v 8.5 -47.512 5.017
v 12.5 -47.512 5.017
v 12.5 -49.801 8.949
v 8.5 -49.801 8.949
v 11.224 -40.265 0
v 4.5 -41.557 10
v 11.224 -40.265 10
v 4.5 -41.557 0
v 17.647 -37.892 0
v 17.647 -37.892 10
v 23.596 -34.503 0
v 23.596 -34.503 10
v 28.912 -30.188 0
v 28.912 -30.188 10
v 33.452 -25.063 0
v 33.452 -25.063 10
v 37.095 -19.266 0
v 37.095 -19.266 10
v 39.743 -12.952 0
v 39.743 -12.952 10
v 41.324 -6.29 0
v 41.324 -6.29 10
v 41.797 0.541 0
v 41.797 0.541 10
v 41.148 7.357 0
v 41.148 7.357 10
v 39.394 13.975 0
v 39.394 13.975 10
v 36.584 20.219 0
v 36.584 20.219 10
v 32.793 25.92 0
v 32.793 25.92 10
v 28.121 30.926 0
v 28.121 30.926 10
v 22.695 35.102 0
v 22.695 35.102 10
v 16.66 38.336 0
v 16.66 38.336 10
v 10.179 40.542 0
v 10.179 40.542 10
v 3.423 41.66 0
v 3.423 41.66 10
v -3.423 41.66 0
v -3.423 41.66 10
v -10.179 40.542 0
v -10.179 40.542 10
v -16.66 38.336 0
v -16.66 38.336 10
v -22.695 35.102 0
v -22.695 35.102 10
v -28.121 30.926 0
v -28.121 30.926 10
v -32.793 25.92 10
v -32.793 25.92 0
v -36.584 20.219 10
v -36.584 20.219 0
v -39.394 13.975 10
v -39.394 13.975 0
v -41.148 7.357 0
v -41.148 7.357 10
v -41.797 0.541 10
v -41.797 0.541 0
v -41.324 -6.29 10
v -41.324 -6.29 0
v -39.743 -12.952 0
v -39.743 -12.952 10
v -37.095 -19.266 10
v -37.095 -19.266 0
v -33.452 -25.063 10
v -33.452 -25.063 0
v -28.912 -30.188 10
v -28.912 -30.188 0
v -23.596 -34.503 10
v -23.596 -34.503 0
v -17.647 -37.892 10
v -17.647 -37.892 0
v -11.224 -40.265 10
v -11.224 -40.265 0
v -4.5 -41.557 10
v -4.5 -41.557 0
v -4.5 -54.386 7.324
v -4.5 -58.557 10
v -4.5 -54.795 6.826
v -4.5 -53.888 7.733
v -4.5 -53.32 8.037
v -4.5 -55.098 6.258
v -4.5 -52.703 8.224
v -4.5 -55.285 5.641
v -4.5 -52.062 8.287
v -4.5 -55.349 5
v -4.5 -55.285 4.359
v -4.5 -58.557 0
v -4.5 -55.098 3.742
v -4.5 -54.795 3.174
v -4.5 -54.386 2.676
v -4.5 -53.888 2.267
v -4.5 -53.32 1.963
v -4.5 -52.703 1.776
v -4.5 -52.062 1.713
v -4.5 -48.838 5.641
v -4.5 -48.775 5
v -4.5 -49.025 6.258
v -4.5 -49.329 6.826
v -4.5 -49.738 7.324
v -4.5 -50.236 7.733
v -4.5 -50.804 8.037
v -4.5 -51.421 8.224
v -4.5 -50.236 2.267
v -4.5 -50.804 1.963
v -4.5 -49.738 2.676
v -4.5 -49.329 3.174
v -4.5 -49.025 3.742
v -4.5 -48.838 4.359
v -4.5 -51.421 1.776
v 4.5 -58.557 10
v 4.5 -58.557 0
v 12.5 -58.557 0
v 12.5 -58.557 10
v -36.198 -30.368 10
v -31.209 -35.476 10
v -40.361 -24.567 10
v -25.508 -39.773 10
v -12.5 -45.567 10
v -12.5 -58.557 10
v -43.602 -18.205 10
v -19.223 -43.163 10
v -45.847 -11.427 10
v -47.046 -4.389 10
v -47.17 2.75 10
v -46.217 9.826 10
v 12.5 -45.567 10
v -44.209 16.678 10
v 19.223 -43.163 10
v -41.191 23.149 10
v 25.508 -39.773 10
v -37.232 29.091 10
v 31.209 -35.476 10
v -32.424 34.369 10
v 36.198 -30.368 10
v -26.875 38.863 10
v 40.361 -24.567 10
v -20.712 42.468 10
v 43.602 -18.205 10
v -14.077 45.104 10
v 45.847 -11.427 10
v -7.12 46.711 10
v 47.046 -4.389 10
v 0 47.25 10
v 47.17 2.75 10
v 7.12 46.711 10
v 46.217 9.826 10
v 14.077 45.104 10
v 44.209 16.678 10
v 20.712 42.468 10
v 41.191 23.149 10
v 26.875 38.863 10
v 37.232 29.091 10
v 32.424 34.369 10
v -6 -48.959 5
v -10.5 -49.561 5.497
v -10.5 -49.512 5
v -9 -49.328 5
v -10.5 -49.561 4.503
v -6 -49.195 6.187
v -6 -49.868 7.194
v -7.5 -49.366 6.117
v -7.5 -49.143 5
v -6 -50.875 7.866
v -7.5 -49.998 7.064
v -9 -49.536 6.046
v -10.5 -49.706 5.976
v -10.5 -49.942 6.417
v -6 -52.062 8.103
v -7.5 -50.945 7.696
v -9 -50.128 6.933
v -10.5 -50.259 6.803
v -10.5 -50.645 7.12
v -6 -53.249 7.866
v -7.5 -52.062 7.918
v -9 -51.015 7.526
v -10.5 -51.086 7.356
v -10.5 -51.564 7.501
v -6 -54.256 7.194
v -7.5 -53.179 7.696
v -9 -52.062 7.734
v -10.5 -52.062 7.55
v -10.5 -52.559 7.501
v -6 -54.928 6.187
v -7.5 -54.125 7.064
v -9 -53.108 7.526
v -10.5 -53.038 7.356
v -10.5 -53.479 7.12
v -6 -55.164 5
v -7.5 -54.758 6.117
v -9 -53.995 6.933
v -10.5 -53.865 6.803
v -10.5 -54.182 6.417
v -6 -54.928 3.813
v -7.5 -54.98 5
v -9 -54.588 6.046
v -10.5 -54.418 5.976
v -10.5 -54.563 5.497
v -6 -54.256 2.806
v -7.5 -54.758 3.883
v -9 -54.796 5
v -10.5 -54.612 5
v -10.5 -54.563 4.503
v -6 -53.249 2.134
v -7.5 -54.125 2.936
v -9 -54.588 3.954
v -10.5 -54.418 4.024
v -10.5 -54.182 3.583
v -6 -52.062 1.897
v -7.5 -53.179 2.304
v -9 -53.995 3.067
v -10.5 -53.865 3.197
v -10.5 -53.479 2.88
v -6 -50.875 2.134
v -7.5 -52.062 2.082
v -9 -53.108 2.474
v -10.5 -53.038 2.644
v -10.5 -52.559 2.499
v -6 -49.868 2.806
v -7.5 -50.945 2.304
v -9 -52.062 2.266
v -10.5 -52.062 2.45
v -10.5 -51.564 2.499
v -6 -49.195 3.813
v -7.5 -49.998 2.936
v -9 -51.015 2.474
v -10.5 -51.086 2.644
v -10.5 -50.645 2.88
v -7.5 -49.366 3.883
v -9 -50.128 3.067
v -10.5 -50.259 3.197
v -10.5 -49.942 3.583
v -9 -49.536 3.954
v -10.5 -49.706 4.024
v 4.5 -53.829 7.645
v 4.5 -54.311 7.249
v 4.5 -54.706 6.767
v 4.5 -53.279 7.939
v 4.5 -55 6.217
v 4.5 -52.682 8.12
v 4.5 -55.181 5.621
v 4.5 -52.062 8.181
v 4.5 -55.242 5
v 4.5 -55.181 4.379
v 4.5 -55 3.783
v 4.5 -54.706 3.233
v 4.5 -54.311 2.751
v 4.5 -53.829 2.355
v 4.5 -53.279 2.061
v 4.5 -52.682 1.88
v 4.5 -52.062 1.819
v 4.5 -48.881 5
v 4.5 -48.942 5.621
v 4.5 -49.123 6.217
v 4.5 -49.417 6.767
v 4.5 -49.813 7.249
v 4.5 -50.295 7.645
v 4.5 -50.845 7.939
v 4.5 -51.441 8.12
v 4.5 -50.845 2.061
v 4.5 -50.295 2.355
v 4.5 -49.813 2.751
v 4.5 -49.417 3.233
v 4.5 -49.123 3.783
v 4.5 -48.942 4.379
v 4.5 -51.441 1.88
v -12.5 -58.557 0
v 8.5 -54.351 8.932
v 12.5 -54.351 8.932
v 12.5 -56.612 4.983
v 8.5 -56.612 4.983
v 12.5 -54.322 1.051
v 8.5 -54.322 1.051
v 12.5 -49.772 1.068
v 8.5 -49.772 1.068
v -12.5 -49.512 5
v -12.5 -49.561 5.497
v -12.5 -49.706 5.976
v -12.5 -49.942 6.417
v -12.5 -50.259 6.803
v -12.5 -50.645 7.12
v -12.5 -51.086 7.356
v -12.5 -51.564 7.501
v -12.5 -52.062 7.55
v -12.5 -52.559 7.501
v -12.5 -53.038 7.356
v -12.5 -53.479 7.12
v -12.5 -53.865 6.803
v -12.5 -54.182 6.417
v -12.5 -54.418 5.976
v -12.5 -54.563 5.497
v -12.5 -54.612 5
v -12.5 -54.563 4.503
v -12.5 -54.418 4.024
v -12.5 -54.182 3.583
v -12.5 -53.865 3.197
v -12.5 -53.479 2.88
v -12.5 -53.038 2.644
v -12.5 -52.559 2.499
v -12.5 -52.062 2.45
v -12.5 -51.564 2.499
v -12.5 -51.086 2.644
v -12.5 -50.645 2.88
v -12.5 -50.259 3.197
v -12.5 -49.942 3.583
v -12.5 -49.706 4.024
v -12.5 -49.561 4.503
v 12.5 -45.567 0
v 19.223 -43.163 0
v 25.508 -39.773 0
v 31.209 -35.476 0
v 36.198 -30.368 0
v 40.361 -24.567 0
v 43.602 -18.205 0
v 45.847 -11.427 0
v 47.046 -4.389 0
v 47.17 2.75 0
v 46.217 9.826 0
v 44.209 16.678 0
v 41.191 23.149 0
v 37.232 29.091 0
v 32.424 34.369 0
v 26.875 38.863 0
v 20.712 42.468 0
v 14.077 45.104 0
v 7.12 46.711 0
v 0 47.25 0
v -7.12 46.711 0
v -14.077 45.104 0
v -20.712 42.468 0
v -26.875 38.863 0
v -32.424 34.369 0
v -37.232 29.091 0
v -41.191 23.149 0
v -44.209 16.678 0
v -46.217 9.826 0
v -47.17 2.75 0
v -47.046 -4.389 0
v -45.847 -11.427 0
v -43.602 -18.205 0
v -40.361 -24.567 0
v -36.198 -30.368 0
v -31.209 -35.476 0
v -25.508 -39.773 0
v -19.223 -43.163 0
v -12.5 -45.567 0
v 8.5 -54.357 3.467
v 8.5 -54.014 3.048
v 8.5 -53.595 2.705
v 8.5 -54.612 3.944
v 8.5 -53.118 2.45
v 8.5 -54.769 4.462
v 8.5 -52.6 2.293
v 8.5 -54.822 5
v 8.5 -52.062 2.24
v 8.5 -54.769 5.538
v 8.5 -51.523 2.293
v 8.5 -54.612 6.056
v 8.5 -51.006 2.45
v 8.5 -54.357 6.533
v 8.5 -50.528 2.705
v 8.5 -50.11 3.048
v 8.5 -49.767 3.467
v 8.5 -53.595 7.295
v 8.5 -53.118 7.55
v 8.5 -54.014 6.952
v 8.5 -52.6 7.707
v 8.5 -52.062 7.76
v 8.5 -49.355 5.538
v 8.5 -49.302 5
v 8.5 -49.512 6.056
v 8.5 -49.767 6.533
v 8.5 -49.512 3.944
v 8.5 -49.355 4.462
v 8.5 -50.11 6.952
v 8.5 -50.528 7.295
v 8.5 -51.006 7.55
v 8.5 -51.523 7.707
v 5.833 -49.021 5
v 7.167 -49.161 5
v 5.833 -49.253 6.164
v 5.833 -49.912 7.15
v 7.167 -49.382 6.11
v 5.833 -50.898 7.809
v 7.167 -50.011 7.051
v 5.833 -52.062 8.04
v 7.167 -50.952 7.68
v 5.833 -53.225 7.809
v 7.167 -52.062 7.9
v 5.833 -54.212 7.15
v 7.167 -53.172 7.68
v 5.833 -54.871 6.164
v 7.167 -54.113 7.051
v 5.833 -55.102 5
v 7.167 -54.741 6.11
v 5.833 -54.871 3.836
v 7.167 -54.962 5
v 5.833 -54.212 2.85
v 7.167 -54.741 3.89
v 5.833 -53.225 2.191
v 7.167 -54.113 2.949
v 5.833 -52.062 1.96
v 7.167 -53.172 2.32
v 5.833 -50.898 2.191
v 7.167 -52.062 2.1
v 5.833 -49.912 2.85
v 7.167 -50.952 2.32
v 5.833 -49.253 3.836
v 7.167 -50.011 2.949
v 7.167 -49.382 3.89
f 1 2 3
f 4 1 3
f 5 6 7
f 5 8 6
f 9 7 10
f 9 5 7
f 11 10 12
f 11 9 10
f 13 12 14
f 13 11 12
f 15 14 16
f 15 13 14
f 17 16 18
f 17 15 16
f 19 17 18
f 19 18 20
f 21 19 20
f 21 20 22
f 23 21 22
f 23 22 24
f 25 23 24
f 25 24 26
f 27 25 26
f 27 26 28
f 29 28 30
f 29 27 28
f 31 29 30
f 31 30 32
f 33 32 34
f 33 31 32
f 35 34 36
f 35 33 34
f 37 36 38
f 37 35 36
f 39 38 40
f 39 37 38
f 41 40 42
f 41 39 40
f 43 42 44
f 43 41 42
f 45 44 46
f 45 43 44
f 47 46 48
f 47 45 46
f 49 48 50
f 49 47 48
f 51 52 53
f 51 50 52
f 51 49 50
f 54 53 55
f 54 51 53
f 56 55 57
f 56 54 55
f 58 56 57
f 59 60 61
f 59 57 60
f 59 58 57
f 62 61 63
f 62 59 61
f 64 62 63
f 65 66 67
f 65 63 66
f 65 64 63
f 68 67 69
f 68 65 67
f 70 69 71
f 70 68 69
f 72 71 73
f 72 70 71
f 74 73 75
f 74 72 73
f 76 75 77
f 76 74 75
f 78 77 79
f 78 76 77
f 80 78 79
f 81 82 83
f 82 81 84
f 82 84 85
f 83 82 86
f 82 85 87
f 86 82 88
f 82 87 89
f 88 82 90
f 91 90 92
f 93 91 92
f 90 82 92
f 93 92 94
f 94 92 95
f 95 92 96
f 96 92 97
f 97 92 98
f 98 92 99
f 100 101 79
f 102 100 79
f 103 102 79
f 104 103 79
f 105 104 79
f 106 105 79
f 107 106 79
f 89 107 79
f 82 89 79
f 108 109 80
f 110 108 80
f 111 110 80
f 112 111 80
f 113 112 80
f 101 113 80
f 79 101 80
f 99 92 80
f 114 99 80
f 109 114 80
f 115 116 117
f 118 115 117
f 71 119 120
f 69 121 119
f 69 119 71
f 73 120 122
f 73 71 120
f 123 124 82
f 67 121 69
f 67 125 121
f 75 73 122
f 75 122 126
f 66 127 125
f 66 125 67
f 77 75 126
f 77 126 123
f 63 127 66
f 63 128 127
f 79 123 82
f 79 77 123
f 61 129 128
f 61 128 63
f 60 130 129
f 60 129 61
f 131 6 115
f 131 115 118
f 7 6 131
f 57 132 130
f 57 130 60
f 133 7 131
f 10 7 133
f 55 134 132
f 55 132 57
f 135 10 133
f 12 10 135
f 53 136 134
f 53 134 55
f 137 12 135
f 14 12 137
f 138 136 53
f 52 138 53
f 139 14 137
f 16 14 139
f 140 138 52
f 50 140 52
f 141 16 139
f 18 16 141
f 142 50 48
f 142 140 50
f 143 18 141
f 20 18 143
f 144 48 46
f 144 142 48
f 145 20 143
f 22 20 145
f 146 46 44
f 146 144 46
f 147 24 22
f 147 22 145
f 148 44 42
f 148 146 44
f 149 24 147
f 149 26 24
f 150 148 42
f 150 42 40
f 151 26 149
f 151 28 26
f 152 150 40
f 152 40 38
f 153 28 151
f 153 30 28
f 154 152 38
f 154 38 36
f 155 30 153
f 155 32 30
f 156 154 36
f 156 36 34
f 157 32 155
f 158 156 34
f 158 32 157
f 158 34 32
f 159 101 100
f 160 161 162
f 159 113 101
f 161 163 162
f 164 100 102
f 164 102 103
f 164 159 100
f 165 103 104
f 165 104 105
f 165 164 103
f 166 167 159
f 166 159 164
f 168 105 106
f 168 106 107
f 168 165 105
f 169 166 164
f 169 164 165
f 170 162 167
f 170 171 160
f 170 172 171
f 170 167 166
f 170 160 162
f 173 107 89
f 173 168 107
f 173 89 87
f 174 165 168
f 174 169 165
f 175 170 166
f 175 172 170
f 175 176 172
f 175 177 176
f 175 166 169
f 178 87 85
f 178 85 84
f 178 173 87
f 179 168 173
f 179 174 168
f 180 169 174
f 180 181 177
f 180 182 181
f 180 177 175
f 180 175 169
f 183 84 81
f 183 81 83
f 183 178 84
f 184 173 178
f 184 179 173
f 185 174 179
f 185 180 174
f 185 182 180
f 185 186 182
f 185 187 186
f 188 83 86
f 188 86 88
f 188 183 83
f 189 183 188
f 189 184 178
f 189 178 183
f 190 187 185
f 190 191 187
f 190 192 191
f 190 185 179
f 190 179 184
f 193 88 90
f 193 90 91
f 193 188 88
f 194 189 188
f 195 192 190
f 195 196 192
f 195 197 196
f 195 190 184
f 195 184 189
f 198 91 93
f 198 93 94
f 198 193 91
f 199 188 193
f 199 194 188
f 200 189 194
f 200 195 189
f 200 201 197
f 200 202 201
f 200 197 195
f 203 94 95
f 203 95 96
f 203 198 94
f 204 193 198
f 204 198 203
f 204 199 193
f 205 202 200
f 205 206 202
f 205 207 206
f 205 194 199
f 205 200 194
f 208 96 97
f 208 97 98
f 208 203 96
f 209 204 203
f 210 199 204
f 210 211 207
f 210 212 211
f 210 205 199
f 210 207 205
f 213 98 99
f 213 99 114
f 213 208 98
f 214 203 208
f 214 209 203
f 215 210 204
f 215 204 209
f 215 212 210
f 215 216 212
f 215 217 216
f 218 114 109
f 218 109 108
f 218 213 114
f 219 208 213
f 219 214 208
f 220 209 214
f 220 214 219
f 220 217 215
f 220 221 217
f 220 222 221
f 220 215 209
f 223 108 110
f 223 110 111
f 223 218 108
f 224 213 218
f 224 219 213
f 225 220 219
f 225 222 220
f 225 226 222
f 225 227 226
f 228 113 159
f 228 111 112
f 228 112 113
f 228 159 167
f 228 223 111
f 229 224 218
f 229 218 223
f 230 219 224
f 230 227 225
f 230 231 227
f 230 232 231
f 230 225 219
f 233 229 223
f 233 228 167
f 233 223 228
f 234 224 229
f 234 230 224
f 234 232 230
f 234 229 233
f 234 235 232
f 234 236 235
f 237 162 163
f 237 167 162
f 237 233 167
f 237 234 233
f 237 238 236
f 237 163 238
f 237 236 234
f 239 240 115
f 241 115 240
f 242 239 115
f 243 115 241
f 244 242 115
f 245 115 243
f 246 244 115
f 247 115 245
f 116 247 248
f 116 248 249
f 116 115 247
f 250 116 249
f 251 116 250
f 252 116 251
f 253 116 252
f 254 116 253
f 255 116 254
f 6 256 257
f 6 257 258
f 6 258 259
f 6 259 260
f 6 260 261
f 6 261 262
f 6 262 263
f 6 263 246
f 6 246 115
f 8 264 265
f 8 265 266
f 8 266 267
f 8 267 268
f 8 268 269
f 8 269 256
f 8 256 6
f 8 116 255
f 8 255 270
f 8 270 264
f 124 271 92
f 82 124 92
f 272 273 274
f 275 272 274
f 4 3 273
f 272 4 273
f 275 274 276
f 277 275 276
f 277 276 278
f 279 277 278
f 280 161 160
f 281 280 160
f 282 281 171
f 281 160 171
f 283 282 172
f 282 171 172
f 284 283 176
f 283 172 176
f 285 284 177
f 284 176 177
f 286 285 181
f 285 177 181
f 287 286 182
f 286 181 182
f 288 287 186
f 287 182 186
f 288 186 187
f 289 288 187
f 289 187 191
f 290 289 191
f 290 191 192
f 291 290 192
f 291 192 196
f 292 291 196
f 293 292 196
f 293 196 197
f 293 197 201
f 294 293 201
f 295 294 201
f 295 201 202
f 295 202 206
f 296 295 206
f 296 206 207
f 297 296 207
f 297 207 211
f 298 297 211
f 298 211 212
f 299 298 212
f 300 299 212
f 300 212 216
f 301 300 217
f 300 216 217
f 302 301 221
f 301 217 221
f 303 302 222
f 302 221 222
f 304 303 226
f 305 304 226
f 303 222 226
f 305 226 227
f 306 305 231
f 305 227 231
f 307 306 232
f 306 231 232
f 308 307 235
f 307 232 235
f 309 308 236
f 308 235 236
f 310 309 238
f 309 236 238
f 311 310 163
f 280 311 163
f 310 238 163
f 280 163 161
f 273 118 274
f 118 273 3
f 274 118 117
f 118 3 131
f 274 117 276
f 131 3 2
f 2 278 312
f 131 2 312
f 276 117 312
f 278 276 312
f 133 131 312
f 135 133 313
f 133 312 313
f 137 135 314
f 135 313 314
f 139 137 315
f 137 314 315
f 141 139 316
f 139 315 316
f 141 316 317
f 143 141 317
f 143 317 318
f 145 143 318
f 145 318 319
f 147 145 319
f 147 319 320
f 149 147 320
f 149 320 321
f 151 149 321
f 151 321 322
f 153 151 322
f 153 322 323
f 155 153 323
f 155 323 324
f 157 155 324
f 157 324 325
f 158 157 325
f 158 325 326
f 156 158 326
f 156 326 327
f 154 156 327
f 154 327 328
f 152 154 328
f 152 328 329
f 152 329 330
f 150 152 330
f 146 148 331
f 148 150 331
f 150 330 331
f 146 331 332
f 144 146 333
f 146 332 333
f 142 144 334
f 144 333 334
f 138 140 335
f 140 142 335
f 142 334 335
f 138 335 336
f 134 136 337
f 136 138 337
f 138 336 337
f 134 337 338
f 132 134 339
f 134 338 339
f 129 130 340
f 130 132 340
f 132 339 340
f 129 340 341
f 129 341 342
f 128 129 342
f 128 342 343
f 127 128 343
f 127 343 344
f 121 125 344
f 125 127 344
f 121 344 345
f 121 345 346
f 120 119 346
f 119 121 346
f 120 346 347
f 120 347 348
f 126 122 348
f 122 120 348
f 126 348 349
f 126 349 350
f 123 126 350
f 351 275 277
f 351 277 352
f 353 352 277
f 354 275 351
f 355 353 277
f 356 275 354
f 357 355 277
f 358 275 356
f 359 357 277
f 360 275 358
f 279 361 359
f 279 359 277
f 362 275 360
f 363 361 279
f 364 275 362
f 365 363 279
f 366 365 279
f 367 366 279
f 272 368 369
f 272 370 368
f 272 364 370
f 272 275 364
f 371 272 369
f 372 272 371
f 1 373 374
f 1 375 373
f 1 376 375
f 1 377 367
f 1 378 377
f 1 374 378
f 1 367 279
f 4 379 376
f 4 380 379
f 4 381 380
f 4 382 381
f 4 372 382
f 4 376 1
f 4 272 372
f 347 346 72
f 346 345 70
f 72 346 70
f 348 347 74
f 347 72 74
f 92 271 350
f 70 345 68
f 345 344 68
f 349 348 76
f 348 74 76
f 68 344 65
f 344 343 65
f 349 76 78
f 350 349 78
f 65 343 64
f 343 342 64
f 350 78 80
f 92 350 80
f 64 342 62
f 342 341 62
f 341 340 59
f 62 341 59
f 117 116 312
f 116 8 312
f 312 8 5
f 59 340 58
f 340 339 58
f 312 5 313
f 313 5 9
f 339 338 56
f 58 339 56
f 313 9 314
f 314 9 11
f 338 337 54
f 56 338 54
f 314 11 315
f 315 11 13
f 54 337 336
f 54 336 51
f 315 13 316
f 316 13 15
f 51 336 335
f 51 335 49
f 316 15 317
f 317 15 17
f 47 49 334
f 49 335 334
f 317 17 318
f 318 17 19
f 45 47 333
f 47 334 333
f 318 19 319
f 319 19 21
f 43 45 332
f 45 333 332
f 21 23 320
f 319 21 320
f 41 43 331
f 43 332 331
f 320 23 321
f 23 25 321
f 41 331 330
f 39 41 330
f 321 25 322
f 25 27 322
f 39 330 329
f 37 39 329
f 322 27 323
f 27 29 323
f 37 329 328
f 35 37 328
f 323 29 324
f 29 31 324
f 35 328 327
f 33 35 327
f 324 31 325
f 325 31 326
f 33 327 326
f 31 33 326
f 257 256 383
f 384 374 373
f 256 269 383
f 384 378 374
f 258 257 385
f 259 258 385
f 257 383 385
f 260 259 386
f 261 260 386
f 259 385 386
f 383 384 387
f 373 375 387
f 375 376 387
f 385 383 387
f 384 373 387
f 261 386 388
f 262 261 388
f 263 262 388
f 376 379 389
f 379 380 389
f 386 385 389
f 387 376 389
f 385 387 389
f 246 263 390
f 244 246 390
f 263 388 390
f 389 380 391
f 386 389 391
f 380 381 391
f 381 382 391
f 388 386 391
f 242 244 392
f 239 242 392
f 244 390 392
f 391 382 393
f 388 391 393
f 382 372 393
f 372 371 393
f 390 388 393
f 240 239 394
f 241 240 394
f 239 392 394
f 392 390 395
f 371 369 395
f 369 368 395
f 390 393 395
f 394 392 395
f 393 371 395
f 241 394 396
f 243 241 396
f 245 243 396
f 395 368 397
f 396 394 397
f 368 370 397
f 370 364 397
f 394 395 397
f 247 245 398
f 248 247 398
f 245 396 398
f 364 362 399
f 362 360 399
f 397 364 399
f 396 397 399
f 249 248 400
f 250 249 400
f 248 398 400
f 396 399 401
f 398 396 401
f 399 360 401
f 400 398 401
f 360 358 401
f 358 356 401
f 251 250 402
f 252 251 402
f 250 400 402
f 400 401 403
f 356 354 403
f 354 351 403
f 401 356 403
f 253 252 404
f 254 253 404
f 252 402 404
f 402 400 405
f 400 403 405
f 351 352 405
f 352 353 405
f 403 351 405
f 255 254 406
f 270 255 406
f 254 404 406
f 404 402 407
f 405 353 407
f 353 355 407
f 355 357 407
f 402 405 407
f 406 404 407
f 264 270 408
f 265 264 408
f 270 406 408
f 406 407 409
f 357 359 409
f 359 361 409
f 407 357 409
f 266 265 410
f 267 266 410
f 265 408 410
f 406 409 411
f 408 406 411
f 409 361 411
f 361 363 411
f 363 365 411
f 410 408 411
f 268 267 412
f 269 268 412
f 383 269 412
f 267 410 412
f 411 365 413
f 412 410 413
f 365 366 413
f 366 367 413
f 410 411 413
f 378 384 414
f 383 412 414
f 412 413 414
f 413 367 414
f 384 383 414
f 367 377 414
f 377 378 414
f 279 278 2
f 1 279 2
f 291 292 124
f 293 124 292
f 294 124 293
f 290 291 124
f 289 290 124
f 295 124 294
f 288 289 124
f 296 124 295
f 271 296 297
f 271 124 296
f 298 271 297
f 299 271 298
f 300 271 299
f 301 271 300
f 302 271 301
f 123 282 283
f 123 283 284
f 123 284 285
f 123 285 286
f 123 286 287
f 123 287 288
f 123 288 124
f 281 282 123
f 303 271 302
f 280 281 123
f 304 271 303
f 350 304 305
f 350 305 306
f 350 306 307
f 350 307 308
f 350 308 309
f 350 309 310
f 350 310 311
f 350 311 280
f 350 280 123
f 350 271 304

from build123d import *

# Parameters (mm, degrees)
F0_R      = 47.25
F0_R_2    = 41.8
F1_DEPTH  = 10
F2_W      = 4.5
F2_H      = 12.6647017896
F3_DEPTH  = 25
F4_W      = 8
F4_H      = 17
F5_DEPTH  = 10
F7_DEPTH  = 4
F8_R      = 2.55
F9_DEPTH  = 25
F10_SIZE2 = 6
F10_SIZE  = 0.7367073654


# Not quite as in the source:
# - a fillet or chamfer that OpenCascade refuses, or shapes differently, is made with other operations: its cross-section is extruded or revolved along the edge and cut away or added


with BuildPart() as f1:
    # F0 (on Top) → F1 (new body)
    with BuildSketch(Plane.XY):
        Circle(F0_R)
        Circle(F0_R_2, mode=Mode.SUBTRACT)
    extrude(amount=F1_DEPTH)

    # F2 (on Top) → F3 (cut)
    with BuildSketch(Plane.XY):
        with Locations((-2.25, -45.0298693031)):
            Rectangle(F2_W, F2_H)
        with Locations((2.25, -45.0298693031)):
            Rectangle(F2_W, F2_H)
    extrude(amount=F3_DEPTH, mode=Mode.SUBTRACT)

    # F4 (on Top) → F5 (join)
    with BuildSketch(Plane.XY):
        with Locations((8.5, -50.0570691941)):
            Rectangle(F4_W, F4_H)
        with Locations((-8.5, -50.0570691941)):
            Rectangle(F4_W, F4_H)
    extrude(amount=F5_DEPTH)

    # F6 (on face) → F7 (cut)
    with BuildSketch(Plane.YZ.offset(12.5)):
        Polygon((-49.7724240202, 1.0679314721), (-47.5118511184, 5.0166414077), (-49.8012477839, 8.9487099356), (-54.3512173512, 8.9320685279), (-56.6117902531, 4.9833585923), (-54.3223935876, 1.0512900644), align=None)
    extrude(amount=-F7_DEPTH, mode=Mode.SUBTRACT)

    # F8 (on face) → F9 (cut)
    with BuildSketch(Plane.YZ.offset(8.5)):
        with Locations((-52.0618206857, 5)):
            Circle(F8_R)
    extrude(amount=-F9_DEPTH, mode=Mode.SUBTRACT)

    # F10
    f10_edges = [f1.edges().sort_by_distance(p)[0] for p in [
        (-4.5, -54.611821, 5),
    ]]
    f10_side = f1.faces().sort_by_distance((-4.5, -50.057069, 0.197231))[0]
    chamfer(f10_edges, length=F10_SIZE, length2=F10_SIZE2, reference=f10_side)

    # F11: chamfer of 6 x 0.6306254116 on 1 edges, made by hand

    # F11_s1 → F11_t2 (revolve, cut)
    with BuildSketch(Plane.XY.offset(5)):
        Polygon((4.5, -48.8811952741), (10.5, -49.5118206857), (4.5, -49.5118206857), align=None)
    revolve(axis=Axis((4.5, -52.0618206857, 5), (1, 0, 0)), mode=Mode.SUBTRACT)


solid = f1.part
